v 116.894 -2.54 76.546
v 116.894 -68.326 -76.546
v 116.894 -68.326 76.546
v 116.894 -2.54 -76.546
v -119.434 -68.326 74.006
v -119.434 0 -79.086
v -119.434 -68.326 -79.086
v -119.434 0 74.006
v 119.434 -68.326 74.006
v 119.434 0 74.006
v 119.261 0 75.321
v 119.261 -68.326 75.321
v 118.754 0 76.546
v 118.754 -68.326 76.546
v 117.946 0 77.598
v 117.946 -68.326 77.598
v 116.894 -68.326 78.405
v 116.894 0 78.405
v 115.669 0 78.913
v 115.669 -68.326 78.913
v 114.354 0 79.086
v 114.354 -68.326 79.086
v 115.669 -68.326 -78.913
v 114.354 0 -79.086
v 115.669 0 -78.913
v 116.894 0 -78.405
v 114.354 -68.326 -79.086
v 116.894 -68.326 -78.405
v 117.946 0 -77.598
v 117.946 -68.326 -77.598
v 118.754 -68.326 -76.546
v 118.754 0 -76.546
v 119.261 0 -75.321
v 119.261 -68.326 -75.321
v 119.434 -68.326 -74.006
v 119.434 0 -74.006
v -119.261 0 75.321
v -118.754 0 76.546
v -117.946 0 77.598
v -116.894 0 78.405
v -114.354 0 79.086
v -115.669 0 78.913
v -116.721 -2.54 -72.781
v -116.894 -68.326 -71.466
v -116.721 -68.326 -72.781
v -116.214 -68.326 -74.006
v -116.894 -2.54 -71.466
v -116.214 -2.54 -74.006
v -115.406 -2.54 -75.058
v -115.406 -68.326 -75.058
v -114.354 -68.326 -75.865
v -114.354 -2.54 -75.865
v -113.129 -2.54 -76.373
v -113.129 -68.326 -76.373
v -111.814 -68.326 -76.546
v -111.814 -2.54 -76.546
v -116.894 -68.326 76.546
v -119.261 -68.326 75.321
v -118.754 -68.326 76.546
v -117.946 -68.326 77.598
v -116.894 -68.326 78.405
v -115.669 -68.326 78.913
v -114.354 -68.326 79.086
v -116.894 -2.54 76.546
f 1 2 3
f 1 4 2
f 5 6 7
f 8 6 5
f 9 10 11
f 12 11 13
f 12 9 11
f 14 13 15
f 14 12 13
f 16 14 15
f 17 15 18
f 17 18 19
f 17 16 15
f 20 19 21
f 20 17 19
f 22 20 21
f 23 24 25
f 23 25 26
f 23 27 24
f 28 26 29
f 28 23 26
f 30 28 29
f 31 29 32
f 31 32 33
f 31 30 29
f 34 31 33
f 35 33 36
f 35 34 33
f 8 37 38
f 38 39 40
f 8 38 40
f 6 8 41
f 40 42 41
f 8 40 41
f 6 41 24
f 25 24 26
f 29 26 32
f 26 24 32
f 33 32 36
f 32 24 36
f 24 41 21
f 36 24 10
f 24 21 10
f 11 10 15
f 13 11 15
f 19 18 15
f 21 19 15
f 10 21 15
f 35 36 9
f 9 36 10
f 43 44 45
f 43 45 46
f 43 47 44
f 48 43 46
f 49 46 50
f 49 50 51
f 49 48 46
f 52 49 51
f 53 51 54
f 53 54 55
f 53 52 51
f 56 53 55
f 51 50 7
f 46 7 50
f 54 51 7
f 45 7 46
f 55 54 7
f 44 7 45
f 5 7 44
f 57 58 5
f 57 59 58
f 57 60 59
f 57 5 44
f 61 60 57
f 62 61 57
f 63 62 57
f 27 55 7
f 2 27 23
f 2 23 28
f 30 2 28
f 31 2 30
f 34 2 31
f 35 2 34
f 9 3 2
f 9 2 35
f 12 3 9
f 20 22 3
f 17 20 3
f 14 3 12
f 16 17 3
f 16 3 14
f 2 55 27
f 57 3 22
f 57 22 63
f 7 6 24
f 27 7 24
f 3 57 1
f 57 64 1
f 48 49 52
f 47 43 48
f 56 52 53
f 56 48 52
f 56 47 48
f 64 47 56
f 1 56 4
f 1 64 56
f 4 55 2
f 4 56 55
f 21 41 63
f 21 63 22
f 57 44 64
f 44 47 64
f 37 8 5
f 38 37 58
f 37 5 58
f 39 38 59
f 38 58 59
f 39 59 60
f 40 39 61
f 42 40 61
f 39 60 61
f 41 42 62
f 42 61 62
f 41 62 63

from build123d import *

# Parameters (mm, degrees)
F0_W     = 238.8686686754
F0_H     = 158.1714600325
F1_DEPTH = 68.326
F2_T     = -2.54
F3_R     = 5.08


with BuildPart() as f1:
    # F0 (on Front) → F1 (new body)
    with BuildSketch(Plane.XZ):
        Rectangle(F0_W, F0_H)
    extrude(amount=F1_DEPTH)

    # F2
    f2_openings = [f1.faces().sort_by_distance(p)[0] for p in [
        (0, -68.326, 0),
    ]]
    offset(amount=F2_T, openings=f2_openings)

    # F3
    f3_edges = [f1.edges().sort_by_distance(p)[0] for p in [
        (-119.434334, -34.163, 79.08573),
        (119.434334, -34.163, 79.08573),
        (119.434334, -34.163, -79.08573),
        (-116.894334, -35.433, -76.54573),
    ]]
    fillet(f3_edges, radius=F3_R)


solid = f1.part
